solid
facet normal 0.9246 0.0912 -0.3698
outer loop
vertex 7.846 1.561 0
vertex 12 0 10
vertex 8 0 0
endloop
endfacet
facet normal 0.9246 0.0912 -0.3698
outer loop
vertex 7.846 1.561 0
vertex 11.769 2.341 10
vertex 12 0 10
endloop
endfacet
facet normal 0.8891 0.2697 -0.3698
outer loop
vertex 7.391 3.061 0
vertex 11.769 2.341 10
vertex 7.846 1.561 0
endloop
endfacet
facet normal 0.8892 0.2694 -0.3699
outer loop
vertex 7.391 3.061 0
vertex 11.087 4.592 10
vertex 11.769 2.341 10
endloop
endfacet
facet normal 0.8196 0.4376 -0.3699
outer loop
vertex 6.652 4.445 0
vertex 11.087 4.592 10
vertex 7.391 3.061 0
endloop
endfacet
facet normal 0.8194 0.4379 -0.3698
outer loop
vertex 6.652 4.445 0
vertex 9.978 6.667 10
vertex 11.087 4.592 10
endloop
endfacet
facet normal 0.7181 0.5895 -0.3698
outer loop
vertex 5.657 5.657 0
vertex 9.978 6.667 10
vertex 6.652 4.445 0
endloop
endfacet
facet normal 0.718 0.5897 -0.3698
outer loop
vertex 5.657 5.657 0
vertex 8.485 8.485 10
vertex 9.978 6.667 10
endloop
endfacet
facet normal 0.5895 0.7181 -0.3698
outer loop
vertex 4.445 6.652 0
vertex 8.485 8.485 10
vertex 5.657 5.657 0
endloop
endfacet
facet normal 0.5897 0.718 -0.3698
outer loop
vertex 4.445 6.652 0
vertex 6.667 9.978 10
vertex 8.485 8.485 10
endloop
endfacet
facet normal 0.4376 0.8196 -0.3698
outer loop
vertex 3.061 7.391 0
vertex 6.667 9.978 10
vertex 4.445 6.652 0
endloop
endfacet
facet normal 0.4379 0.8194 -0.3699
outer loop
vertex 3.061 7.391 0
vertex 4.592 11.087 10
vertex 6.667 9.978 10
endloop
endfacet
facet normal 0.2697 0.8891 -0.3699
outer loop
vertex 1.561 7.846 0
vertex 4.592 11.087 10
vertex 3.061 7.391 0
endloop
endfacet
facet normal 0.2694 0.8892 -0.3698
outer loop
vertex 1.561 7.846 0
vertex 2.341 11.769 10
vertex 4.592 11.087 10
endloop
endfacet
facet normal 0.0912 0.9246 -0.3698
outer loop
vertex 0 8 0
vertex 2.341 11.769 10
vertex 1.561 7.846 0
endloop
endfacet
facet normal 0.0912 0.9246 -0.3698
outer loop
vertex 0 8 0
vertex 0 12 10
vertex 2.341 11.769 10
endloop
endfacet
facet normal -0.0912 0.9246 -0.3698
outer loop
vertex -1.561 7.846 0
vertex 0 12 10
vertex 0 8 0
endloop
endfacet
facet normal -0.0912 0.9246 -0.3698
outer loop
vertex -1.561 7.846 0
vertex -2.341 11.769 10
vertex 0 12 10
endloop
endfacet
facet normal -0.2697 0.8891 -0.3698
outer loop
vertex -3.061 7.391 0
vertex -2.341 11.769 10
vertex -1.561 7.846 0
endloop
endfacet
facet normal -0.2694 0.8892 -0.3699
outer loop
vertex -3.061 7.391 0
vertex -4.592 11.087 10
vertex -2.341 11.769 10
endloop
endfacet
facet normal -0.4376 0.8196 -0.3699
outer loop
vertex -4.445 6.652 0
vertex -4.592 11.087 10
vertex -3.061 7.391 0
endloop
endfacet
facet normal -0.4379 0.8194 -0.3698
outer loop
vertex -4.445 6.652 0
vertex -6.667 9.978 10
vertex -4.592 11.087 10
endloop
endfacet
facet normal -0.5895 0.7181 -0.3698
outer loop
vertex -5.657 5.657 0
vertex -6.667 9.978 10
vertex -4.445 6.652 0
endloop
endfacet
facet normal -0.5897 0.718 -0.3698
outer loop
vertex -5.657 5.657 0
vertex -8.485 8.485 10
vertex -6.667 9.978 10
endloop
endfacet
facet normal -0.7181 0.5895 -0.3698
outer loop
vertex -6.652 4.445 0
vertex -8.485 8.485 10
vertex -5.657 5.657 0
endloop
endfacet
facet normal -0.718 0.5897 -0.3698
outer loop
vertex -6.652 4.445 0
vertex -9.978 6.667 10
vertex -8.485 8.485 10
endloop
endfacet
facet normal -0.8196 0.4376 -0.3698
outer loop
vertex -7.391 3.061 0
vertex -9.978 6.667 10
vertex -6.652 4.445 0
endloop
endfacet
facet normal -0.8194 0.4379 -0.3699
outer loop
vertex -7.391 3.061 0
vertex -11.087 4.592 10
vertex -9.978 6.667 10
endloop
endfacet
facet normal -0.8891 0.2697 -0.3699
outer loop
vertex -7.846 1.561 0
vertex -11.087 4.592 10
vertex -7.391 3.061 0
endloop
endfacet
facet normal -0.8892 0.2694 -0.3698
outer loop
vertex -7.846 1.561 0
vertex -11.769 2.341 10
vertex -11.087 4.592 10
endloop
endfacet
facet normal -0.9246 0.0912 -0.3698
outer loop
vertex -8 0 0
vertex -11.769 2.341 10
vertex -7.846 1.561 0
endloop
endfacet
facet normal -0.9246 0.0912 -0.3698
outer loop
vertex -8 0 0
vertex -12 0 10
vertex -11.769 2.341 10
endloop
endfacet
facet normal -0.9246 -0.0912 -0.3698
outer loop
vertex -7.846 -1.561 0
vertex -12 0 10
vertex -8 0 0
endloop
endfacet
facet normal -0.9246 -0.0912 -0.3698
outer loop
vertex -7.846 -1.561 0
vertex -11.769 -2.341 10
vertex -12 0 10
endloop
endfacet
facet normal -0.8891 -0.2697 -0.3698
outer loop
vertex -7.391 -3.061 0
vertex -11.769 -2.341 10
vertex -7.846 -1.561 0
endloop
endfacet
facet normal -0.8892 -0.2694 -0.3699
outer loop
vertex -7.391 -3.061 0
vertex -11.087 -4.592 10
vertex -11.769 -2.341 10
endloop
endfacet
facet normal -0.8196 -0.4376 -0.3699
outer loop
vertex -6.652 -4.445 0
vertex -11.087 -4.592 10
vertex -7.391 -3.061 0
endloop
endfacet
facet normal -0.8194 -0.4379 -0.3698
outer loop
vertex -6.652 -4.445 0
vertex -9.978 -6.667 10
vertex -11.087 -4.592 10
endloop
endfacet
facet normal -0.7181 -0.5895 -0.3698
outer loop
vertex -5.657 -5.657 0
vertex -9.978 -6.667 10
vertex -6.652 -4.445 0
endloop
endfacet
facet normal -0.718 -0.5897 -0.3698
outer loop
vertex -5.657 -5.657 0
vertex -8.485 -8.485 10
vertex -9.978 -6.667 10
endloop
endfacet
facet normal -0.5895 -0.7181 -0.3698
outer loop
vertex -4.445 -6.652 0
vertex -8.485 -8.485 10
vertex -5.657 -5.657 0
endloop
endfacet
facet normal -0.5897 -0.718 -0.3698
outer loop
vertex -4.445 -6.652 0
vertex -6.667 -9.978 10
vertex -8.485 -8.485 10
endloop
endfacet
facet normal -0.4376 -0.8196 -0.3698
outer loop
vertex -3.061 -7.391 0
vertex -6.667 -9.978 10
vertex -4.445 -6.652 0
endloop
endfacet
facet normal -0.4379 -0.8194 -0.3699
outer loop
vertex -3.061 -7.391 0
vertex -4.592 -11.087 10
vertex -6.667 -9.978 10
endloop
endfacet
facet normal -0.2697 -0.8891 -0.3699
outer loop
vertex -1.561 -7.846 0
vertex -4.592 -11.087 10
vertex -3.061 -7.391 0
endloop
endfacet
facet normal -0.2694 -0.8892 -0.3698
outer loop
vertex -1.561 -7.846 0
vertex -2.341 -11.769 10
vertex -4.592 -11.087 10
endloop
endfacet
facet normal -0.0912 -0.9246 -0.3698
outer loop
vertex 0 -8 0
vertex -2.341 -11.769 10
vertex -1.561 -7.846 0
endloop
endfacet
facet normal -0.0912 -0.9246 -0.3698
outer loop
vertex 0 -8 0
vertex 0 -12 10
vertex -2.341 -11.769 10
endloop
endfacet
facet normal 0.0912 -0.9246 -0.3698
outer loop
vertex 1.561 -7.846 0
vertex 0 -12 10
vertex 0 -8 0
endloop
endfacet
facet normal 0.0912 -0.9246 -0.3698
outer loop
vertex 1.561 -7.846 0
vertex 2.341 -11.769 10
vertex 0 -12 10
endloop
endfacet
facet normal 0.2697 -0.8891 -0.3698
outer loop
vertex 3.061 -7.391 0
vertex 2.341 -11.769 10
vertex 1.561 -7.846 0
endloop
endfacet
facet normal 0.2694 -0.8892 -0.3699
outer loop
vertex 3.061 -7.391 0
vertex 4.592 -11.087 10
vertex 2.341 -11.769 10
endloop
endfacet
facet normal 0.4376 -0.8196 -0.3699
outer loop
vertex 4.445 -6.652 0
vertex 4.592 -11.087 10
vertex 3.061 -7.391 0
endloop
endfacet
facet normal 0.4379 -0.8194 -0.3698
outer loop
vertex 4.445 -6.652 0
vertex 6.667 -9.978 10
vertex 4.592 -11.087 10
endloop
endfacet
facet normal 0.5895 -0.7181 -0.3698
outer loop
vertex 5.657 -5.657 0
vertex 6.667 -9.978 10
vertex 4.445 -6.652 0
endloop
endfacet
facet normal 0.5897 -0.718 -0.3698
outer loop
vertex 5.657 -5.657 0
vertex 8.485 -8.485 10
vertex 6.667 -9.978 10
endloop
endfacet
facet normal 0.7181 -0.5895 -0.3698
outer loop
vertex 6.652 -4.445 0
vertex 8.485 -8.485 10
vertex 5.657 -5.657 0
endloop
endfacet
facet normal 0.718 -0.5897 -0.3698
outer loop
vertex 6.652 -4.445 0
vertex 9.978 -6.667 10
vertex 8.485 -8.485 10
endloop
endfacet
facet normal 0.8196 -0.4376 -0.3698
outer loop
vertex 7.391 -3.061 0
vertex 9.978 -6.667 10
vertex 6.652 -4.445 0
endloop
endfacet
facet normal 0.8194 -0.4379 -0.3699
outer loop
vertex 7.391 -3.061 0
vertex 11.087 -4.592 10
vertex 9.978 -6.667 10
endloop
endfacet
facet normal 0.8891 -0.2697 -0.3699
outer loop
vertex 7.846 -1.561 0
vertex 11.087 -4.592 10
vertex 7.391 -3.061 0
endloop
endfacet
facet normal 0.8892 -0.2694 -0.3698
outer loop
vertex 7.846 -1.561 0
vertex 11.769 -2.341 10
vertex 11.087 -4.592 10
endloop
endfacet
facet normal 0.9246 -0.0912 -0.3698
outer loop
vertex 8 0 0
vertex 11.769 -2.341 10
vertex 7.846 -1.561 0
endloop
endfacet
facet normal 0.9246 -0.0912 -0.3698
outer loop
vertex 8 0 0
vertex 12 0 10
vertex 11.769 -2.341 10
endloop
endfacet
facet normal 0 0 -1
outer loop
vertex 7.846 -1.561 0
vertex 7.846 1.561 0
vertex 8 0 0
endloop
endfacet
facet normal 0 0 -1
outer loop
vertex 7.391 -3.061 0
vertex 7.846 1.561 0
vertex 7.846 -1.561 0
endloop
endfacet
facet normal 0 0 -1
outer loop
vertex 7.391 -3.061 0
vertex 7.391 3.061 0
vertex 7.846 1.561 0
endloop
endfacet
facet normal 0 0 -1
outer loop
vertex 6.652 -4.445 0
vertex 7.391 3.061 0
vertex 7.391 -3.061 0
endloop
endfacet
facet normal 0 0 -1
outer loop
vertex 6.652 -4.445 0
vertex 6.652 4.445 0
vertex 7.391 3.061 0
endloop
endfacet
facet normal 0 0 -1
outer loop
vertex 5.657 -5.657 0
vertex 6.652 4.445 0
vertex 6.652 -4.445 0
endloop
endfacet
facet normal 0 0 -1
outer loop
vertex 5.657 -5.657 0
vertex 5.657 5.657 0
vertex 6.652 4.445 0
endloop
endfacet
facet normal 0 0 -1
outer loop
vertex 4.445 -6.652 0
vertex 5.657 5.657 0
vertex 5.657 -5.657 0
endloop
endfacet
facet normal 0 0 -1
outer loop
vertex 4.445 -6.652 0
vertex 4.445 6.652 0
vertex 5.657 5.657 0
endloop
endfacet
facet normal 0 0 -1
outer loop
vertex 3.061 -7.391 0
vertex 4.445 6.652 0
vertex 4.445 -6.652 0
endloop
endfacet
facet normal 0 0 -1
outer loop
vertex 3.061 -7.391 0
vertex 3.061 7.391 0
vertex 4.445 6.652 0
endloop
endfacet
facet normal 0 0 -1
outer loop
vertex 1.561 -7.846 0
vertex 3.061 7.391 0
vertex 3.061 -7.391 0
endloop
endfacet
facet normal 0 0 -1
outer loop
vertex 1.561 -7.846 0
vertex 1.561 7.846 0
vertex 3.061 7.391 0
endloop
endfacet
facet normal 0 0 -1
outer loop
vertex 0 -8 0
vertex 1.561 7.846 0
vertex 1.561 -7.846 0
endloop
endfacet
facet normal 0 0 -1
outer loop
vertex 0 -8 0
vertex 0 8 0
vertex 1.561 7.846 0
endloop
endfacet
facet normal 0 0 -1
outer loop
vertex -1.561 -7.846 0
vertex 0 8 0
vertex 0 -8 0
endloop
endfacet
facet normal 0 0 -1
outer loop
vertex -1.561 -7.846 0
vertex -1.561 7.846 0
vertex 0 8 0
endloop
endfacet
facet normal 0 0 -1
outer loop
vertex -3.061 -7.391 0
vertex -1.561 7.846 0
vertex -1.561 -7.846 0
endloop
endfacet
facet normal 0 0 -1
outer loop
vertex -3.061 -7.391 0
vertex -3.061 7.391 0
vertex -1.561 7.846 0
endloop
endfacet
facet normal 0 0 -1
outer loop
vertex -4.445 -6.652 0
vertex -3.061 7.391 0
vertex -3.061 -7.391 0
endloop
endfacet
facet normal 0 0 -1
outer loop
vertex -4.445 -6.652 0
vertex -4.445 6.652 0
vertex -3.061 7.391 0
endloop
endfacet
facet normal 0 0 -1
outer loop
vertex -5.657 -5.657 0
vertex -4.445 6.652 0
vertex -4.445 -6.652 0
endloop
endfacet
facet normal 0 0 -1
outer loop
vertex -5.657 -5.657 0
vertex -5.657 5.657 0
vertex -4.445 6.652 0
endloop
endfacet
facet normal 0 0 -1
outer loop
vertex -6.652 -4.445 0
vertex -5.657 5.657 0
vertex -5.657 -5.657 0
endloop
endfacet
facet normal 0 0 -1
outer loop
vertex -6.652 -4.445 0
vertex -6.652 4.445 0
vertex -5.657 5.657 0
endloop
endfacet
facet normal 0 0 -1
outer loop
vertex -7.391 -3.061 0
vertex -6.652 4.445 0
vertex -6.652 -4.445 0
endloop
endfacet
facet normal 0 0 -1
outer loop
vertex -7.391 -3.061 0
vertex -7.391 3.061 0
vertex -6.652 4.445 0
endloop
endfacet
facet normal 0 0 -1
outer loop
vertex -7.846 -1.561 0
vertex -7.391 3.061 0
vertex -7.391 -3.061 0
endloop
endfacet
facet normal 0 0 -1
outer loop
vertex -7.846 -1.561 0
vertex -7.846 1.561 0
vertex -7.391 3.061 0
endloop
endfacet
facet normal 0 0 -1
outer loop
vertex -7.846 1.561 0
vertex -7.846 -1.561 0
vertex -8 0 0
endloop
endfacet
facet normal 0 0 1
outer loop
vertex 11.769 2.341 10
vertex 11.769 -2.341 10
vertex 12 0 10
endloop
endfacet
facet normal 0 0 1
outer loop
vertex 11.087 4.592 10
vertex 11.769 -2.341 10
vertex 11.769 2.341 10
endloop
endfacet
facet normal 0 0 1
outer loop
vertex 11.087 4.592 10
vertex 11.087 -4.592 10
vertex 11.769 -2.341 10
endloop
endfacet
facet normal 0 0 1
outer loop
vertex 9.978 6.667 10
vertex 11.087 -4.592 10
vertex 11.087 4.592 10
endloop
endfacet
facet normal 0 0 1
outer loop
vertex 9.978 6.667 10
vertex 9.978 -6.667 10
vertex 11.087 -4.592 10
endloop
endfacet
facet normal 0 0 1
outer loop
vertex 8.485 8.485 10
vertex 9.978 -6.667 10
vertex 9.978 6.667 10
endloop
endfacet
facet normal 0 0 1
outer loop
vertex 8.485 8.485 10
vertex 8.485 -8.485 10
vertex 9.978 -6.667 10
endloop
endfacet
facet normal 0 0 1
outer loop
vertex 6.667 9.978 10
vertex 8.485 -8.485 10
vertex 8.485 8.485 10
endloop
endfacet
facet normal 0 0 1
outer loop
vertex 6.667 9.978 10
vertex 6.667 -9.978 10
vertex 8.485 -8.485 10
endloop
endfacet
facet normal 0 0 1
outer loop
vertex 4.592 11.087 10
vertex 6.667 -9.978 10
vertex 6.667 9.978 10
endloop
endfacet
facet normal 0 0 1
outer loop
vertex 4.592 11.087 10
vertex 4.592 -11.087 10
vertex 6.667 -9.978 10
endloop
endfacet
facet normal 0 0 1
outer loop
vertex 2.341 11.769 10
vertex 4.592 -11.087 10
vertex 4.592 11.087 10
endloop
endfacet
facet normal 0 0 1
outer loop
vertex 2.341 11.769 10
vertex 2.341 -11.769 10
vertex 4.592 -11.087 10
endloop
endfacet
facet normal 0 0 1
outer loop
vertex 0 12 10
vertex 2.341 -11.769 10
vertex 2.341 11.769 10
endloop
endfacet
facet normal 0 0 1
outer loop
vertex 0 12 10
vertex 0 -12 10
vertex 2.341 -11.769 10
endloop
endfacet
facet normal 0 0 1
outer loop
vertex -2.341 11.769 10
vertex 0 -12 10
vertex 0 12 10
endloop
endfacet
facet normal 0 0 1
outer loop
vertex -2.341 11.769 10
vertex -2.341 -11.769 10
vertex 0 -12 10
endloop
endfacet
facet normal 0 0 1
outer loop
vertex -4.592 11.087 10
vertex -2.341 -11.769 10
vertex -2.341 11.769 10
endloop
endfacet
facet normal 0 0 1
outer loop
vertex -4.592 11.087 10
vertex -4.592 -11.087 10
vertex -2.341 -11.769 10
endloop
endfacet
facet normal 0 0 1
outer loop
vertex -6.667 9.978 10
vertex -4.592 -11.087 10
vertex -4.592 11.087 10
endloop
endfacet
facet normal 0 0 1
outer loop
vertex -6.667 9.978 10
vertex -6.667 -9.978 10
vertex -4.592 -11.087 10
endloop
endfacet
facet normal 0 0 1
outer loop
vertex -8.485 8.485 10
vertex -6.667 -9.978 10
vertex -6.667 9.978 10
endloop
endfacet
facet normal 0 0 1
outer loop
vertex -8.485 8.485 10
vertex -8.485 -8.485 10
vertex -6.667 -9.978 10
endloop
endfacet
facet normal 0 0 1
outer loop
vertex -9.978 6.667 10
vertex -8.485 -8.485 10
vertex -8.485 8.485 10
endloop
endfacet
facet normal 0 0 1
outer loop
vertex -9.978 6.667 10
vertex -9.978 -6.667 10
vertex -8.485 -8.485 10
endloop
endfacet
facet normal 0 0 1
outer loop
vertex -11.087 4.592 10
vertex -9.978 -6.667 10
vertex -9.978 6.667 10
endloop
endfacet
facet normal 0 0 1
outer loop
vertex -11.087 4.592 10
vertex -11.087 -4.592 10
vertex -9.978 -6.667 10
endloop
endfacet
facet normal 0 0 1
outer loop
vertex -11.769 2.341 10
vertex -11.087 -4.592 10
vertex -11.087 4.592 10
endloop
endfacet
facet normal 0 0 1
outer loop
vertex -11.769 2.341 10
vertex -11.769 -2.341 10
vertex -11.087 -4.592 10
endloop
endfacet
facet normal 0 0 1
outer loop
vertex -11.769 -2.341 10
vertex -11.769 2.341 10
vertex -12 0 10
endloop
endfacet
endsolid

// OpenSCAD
// A frustum drawn as one primitive rather than as a hull.
//
// This is the fixture for the asymmetry that `cylinder(r1, r2)` used to lose
// to `hull()` of two coaxial cylinders. The hull declares the two cylinders it
// was given, and an exporter accepts a cone when both of its rims match a
// declared cylinder - so the workaround exported as a CONICAL_SURFACE while
// the primitive that draws the same shape exported as facets.
//
// The primitive now declares the circle at each of its rims, which is the same
// statement of intent made by one primitive instead of two, so the two
// constructions leave identical provenance and export identically. Nothing in
// the recogniser changed for this.
//
// Expected: one CONICAL_SURFACE for the wall, and the two discs. Both of its
// rims are the complete bound of a disc, which is the easiest of the three rim
// cases - step-chamfered-cylinder covers the shared one.
//
// Measured, and asserted by the driver: what the exporter has to report for
// the above to have happened. A silently faceted export is still a valid one,
// so validity alone cannot see a recogniser that has stopped recognising.
// Three records, and the count is what a frustum is: a circle at each rim, and
// the cone between them. The rims alone used to be the whole of it, which left
// the cone to be recognised from them - and a recognition needs both rims to
// survive whatever the model does next, where a radius and a slope need
// neither. See doc/step-export-development.md, *The rule: declare first,
// recognise second*.
// EXPECT: 3 analytic surfaces available (2 cylindrical, 0 spherical, 0 toroidal, 0 Bezier, 1 conical)
// EXPECT: 1 surface recognised (0 toroidal, 0 spherical, 1 conical, 0 partial), 32 facets replaced
//
// A frustum, (pi*h/3)(r1^2 + r1*r2 + r2^2) = (pi*10/3)(64 + 96 + 144).
// ROUNDTRIP: Cone=1 Plane=2
// VOLUME: 3183.4805556
$fn = 32;
cylinder(h = 10, r1 = 8, r2 = 12);
